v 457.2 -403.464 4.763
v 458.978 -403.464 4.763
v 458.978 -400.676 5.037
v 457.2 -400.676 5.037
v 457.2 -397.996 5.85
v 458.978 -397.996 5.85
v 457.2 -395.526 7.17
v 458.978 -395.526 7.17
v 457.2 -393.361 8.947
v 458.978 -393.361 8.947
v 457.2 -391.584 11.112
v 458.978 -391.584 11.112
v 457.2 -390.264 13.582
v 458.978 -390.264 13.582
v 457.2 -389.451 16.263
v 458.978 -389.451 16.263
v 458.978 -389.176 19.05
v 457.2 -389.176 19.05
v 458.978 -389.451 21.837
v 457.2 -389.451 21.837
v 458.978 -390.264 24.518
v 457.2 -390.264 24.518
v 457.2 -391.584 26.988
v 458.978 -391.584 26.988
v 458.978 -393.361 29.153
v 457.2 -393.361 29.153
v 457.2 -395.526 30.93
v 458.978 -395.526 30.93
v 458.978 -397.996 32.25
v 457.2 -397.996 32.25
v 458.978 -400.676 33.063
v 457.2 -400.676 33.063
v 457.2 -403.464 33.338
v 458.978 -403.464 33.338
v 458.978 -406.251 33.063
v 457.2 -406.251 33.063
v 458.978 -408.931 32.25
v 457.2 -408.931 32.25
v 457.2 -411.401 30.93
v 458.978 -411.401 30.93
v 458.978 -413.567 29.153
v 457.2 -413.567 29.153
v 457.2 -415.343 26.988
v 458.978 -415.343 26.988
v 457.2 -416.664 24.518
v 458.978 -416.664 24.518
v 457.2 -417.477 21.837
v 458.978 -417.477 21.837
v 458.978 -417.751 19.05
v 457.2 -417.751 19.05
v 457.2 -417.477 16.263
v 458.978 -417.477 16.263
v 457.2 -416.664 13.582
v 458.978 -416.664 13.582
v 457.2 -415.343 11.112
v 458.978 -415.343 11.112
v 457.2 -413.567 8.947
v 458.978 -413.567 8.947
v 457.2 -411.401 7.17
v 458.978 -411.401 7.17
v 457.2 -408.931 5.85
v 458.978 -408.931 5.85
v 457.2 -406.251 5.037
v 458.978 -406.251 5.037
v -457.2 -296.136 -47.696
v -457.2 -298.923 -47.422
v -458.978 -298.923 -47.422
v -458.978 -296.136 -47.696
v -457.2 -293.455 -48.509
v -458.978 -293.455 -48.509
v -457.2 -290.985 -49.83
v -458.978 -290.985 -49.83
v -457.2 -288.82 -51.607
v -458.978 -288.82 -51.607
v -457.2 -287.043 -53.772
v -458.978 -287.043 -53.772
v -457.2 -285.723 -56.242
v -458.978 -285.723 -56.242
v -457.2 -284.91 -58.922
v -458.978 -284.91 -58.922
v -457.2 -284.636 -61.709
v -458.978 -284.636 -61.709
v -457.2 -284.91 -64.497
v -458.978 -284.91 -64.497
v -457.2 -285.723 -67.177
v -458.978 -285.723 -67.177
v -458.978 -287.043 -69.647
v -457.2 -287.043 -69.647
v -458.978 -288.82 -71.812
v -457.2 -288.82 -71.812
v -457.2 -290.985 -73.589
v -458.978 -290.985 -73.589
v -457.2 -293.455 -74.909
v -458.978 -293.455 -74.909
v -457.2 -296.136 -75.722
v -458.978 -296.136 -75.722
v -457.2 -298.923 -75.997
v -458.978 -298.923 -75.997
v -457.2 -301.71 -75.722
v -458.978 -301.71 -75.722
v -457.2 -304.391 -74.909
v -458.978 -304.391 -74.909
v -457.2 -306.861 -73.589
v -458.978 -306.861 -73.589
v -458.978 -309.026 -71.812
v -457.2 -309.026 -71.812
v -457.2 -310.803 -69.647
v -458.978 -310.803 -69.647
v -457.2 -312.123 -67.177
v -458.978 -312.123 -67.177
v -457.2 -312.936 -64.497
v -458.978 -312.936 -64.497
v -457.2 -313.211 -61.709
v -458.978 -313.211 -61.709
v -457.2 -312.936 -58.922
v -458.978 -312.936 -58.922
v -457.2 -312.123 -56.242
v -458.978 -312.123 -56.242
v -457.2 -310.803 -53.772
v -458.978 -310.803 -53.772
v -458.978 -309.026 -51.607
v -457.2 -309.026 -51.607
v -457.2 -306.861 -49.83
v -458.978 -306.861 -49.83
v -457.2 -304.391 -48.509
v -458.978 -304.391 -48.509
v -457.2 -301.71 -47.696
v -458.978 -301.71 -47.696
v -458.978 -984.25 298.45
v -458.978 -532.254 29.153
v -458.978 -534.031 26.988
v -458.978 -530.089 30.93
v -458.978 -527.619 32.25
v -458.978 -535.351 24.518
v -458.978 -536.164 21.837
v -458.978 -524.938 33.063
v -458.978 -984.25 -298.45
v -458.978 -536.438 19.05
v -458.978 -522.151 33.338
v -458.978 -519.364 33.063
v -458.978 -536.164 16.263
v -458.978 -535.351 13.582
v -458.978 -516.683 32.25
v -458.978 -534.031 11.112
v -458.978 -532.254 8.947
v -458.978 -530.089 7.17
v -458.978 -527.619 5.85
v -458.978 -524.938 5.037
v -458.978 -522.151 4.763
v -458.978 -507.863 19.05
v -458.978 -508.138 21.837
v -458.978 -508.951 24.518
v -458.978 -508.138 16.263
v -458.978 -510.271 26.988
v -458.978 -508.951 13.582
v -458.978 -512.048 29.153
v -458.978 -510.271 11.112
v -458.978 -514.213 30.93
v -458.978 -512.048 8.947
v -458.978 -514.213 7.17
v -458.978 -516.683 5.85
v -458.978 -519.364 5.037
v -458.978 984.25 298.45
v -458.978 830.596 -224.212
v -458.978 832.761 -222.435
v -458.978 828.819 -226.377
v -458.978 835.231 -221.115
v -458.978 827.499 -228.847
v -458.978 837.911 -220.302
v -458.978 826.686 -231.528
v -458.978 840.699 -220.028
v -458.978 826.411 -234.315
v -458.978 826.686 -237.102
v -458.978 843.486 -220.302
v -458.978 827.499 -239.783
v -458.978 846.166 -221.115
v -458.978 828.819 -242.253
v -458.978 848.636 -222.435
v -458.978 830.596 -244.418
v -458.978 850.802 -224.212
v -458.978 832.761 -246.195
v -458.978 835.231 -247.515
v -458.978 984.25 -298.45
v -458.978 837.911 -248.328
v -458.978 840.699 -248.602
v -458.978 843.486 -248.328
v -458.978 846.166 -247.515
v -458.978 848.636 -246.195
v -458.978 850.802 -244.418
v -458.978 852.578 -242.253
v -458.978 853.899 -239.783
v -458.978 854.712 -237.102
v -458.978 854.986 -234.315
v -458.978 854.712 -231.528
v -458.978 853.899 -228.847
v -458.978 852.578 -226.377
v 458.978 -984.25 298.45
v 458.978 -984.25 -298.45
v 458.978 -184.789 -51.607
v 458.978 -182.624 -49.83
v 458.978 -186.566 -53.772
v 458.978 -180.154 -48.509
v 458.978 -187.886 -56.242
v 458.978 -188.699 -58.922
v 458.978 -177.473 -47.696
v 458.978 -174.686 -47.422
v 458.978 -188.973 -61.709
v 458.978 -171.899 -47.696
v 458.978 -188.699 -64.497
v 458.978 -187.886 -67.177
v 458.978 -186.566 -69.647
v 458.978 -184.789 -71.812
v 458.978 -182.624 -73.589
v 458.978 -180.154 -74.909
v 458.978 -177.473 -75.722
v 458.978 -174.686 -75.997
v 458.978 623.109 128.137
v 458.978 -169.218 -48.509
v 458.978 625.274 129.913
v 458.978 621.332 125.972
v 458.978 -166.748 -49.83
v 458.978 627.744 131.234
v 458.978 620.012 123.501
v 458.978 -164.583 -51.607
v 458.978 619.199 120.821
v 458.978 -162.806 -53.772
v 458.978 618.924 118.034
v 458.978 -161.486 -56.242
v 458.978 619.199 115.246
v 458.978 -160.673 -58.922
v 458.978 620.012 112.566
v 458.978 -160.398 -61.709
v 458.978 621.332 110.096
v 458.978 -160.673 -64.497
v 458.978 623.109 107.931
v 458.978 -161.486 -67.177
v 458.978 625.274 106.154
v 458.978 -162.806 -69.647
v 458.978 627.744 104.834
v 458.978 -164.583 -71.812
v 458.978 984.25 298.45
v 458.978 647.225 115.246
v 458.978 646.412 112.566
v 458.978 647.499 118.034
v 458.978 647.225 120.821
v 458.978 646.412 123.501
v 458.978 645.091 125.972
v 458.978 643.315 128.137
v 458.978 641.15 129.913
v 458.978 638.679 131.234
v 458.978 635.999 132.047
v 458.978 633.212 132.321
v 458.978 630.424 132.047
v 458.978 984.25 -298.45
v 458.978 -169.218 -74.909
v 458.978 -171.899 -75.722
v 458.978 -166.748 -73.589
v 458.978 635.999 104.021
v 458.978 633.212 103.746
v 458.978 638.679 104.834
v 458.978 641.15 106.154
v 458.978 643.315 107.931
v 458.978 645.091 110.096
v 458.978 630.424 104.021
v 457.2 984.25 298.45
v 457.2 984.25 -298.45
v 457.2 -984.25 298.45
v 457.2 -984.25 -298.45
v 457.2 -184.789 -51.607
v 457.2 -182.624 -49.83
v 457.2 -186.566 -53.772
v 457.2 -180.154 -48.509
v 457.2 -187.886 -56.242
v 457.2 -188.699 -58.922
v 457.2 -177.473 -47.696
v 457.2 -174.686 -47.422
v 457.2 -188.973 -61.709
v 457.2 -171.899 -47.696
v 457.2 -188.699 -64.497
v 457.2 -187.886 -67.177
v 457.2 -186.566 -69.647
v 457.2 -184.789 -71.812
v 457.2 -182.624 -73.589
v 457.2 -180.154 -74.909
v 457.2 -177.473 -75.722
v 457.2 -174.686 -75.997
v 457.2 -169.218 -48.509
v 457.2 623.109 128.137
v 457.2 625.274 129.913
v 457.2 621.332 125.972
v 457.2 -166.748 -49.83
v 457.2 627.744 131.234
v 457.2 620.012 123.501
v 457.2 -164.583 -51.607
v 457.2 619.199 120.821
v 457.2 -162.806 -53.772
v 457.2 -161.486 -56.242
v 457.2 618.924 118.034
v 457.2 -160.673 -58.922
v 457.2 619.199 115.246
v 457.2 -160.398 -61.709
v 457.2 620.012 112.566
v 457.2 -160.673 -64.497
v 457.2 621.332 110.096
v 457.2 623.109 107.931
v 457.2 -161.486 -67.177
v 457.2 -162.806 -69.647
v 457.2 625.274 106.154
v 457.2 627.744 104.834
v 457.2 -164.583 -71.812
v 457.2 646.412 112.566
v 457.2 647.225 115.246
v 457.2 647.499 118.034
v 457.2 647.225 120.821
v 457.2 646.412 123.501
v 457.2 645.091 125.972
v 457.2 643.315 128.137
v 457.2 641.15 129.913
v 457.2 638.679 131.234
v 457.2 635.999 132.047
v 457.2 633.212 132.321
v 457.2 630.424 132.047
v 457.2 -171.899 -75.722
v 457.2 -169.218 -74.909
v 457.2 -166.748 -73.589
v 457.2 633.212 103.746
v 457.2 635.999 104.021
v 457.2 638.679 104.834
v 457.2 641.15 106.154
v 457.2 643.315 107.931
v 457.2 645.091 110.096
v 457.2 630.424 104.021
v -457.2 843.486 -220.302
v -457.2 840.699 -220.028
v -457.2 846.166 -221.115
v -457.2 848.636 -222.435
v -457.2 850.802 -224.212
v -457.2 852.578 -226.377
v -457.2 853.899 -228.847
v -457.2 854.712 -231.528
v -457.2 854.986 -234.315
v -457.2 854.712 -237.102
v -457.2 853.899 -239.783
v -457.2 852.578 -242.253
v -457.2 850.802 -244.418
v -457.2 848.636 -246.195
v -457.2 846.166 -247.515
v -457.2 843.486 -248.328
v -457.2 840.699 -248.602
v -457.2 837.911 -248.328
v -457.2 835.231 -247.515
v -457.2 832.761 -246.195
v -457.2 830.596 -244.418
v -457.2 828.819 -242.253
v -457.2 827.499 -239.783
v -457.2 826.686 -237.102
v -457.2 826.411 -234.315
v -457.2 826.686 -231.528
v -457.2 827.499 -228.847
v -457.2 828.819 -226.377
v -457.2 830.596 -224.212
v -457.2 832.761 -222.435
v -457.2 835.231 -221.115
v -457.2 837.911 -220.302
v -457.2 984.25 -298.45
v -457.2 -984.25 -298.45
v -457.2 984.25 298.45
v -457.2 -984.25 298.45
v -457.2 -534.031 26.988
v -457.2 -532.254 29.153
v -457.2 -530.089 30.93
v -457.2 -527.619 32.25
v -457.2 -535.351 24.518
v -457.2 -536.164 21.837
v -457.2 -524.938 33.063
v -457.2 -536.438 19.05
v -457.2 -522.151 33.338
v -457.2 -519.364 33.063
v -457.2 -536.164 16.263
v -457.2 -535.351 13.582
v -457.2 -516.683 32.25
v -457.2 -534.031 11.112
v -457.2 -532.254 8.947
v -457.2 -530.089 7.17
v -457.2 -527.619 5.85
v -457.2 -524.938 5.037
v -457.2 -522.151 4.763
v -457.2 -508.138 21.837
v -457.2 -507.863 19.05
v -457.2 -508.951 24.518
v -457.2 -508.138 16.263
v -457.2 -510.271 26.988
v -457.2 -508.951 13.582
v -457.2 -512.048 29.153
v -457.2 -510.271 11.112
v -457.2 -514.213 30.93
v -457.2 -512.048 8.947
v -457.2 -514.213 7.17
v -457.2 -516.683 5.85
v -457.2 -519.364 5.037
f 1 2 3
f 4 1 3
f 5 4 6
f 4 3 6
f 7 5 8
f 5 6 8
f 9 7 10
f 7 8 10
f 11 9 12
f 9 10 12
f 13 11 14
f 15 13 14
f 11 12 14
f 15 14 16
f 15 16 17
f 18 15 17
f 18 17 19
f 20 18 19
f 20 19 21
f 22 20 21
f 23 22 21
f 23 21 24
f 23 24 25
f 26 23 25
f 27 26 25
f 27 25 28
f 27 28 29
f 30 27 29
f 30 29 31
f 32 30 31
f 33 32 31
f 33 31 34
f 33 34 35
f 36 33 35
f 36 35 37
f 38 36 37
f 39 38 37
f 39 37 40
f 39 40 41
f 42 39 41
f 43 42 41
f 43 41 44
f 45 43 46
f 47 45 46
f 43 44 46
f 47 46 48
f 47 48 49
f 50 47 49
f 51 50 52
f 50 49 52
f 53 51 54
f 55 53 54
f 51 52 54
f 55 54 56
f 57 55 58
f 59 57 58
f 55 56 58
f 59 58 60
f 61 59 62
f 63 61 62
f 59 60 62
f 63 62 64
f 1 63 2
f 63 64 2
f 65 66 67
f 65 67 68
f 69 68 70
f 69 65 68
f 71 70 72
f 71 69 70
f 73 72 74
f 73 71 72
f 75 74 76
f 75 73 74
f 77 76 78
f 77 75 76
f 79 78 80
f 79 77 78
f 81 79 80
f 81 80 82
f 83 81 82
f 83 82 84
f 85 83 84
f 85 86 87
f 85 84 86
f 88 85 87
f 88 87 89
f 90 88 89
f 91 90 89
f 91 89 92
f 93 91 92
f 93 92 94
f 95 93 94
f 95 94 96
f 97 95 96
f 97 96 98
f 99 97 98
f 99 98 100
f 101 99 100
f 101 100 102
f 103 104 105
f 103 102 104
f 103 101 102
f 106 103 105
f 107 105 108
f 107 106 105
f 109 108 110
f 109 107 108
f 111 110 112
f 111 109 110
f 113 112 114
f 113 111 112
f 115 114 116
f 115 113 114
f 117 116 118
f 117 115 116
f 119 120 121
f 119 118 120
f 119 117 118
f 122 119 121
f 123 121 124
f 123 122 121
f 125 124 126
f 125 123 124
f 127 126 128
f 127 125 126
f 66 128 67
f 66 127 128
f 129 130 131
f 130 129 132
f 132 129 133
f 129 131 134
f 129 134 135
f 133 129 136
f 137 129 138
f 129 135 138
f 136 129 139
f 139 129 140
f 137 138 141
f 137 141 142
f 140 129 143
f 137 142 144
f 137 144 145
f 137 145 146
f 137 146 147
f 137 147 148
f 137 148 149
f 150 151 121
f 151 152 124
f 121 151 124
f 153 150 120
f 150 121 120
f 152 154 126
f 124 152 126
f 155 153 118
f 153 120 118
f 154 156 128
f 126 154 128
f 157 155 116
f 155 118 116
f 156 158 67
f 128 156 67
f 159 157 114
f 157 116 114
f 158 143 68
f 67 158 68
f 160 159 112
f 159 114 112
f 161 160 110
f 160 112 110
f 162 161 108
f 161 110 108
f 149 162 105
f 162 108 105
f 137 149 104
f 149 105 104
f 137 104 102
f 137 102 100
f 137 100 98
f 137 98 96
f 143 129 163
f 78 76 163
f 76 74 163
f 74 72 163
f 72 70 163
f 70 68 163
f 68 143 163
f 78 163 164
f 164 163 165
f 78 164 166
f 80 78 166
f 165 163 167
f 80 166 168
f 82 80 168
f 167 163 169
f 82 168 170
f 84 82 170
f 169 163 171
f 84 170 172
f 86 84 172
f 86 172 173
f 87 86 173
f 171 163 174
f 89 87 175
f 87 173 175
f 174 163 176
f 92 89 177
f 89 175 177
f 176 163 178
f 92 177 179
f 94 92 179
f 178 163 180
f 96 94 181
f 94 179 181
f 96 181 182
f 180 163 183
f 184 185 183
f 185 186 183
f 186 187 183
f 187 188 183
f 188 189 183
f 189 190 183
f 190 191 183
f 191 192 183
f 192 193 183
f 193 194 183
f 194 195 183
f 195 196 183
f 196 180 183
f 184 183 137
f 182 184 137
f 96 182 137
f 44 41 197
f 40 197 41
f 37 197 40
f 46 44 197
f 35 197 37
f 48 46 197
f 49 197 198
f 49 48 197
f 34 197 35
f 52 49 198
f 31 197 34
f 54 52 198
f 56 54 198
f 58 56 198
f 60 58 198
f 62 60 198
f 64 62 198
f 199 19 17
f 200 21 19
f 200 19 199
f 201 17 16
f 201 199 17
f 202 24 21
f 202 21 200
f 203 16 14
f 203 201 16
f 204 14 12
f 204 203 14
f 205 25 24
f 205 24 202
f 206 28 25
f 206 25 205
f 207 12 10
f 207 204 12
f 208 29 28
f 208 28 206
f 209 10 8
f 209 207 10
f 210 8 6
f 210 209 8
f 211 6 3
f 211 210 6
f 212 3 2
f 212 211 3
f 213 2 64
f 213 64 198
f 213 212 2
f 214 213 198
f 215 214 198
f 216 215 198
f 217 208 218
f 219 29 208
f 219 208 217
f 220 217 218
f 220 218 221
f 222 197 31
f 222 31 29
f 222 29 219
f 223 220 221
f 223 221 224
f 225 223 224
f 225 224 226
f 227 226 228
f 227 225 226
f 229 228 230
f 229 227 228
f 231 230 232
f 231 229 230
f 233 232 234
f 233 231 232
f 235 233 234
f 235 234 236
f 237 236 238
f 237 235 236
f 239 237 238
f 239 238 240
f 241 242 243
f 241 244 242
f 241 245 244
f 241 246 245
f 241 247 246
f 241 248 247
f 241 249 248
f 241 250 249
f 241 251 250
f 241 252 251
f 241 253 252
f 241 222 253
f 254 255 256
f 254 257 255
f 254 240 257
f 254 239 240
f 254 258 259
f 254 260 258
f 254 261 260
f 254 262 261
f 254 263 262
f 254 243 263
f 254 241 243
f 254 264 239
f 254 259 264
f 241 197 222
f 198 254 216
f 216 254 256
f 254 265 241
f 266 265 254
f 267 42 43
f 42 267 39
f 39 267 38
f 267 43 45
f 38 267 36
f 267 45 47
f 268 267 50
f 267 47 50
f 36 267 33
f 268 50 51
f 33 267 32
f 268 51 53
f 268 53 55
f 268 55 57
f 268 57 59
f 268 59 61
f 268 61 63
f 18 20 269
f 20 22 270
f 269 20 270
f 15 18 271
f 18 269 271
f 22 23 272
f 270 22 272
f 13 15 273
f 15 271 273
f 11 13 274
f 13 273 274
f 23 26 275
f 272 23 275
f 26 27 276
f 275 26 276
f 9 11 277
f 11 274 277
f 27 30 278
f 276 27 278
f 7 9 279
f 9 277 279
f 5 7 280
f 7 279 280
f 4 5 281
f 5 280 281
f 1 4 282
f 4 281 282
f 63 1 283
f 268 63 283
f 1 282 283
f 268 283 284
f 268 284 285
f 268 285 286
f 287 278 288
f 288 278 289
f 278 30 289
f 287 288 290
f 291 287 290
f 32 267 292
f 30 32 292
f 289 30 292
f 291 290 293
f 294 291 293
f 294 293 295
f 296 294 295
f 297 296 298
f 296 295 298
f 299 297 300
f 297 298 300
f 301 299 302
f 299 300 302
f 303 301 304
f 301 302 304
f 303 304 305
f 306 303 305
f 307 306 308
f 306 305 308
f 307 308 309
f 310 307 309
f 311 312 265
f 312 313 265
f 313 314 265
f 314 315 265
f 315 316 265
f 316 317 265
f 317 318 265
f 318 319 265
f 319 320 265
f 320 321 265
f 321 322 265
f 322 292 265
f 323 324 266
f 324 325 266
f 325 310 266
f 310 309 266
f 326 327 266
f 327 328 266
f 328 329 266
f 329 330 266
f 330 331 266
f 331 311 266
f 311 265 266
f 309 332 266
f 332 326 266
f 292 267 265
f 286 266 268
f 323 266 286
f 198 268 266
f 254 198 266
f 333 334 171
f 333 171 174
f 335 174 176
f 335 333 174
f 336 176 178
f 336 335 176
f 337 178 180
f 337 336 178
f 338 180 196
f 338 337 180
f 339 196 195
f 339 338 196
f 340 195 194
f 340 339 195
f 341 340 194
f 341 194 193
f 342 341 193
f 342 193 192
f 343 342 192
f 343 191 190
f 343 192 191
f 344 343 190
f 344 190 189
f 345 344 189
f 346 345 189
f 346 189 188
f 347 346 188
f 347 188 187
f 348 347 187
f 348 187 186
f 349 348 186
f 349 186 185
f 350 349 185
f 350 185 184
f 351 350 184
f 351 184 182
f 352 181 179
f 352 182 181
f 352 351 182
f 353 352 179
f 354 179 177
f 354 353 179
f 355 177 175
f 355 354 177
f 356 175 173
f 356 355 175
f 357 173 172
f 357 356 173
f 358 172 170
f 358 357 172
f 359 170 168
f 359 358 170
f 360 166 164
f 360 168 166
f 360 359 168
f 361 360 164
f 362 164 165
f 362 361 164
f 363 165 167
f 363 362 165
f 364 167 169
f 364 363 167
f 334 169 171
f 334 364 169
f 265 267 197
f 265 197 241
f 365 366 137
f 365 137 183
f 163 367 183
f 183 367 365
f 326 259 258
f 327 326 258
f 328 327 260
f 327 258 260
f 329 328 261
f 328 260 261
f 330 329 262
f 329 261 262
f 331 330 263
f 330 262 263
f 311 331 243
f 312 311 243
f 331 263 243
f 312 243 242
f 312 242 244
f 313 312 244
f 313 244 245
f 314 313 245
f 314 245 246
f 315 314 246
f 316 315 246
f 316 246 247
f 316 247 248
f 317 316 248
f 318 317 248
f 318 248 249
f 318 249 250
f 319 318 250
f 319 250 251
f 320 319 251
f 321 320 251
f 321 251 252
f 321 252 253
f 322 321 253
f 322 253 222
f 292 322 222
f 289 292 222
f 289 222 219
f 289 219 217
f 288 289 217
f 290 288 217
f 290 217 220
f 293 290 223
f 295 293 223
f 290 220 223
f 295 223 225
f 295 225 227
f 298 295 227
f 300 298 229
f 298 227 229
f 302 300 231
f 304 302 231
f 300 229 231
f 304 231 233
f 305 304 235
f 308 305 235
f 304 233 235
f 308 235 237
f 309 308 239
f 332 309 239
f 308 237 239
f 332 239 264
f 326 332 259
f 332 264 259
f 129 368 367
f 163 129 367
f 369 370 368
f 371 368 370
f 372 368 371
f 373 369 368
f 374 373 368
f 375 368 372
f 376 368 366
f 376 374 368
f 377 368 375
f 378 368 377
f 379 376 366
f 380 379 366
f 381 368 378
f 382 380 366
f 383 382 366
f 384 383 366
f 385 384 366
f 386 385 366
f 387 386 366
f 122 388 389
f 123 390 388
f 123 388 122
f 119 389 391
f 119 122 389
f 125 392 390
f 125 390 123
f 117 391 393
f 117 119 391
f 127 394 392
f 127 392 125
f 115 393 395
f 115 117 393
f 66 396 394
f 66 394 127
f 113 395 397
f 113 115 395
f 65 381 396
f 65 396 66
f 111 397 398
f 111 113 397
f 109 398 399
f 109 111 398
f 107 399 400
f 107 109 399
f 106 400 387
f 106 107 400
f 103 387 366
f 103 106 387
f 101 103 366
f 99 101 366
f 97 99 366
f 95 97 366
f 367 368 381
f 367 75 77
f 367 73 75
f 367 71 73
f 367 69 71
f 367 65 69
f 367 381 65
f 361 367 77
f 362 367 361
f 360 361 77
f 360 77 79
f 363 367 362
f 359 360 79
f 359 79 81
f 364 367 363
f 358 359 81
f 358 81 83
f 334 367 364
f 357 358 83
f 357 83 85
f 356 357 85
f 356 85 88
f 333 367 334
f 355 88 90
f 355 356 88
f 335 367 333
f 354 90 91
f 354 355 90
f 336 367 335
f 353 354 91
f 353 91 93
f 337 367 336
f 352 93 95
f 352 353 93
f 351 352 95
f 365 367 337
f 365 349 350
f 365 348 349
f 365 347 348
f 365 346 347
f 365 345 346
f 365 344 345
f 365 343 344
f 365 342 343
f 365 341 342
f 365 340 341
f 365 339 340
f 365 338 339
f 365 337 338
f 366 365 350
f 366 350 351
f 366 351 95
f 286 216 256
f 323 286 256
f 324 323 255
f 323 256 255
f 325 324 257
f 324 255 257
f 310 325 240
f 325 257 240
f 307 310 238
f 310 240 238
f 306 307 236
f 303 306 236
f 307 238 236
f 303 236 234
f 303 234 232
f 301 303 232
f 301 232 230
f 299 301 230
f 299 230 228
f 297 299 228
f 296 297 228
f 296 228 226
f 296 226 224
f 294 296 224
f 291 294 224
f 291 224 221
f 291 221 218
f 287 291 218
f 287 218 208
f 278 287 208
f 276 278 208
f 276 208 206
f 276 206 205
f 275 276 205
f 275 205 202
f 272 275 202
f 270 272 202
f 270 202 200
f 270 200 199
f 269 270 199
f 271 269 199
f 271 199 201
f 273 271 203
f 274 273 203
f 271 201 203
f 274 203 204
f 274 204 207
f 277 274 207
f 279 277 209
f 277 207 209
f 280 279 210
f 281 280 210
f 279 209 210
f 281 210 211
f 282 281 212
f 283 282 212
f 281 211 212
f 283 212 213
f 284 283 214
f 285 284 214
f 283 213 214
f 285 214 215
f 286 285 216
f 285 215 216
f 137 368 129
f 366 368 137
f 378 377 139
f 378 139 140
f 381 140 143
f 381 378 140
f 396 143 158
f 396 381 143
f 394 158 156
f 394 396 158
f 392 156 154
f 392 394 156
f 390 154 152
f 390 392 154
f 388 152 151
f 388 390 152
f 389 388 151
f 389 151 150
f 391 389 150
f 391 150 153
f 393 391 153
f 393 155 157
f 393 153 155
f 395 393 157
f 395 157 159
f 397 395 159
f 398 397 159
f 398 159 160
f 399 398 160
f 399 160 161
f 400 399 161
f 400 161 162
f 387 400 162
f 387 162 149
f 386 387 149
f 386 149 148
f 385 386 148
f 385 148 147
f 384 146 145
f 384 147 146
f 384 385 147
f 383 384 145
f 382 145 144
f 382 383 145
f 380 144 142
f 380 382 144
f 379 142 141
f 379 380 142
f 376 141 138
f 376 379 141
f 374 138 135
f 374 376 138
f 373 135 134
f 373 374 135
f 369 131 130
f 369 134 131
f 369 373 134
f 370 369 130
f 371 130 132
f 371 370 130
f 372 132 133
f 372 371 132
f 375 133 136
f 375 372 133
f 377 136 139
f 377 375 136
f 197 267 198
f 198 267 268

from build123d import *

# Parameters (mm, degrees)
BOSS_EXTRUDE1_OUTLINE_W = 596.9
BOSS_EXTRUDE1_OUTLINE_H = 1968.5
BOSS_EXTRUDE1_DEPTH     = 1.778
SKETCH3_R               = 14.2875
CUT_EXTRUDE1_DEPTH      = 2.54
CUT_EXTRUDE2_DEPTH      = 34.798
CUT_EXTRUDE2_DEPTH_BACK = 16.002
SKETCH4_R               = 14.2875


# Read off the part's stored shape, not the designer's step: Boss-Extrude1
with BuildPart() as part:
    # Boss-Extrude1 outline → Boss-Extrude1 (new body)
    with BuildSketch(Plane(origin=(457.2, 0, 0), x_dir=(0, 0, -1), z_dir=(1, 0, 0))):
        Rectangle(BOSS_EXTRUDE1_OUTLINE_W, BOSS_EXTRUDE1_OUTLINE_H)
    extrude(amount=BOSS_EXTRUDE1_DEPTH)


with BuildPart() as body_2:
    # Mirror7: mirrored copy
    add(part.part.mirror(Plane(origin=(0, 0, 0), x_dir=(0, 0, 1), z_dir=(1, 0, 0))))

    # Sketch4 → Cut-Extrude2 (cut, two sides: drawn at the far end of the back side and taken through both)
    with BuildSketch(Plane.ZY.offset(457.2).offset(-CUT_EXTRUDE2_DEPTH_BACK)):
        with Locations((-234.315, 840.698755889)):
            Circle(SKETCH4_R)
        with Locations((-61.7093, -298.923044111)):
            Circle(SKETCH4_R)
        with Locations((19.05, -522.150944111)):
            Circle(SKETCH4_R)
    extrude(amount=CUT_EXTRUDE2_DEPTH + CUT_EXTRUDE2_DEPTH_BACK, mode=Mode.SUBTRACT)


with BuildPart() as part_1:
    add(part.part)

    # Sketch3 → Cut-Extrude1 (cut)
    with BuildSketch(Plane(origin=(458.978, 0, 0), x_dir=(0, 0, -1), z_dir=(1, 0, 0))):
        with Locations((61.7093, -174.68596)):
            Circle(SKETCH3_R)
        with Locations((-19.05, -403.46376)):
            Circle(SKETCH3_R)
        with Locations((-118.0338, 633.21184)):
            Circle(SKETCH3_R)
    extrude(amount=-CUT_EXTRUDE1_DEPTH, mode=Mode.SUBTRACT)


solid = Compound([body_2.part, part_1.part])
